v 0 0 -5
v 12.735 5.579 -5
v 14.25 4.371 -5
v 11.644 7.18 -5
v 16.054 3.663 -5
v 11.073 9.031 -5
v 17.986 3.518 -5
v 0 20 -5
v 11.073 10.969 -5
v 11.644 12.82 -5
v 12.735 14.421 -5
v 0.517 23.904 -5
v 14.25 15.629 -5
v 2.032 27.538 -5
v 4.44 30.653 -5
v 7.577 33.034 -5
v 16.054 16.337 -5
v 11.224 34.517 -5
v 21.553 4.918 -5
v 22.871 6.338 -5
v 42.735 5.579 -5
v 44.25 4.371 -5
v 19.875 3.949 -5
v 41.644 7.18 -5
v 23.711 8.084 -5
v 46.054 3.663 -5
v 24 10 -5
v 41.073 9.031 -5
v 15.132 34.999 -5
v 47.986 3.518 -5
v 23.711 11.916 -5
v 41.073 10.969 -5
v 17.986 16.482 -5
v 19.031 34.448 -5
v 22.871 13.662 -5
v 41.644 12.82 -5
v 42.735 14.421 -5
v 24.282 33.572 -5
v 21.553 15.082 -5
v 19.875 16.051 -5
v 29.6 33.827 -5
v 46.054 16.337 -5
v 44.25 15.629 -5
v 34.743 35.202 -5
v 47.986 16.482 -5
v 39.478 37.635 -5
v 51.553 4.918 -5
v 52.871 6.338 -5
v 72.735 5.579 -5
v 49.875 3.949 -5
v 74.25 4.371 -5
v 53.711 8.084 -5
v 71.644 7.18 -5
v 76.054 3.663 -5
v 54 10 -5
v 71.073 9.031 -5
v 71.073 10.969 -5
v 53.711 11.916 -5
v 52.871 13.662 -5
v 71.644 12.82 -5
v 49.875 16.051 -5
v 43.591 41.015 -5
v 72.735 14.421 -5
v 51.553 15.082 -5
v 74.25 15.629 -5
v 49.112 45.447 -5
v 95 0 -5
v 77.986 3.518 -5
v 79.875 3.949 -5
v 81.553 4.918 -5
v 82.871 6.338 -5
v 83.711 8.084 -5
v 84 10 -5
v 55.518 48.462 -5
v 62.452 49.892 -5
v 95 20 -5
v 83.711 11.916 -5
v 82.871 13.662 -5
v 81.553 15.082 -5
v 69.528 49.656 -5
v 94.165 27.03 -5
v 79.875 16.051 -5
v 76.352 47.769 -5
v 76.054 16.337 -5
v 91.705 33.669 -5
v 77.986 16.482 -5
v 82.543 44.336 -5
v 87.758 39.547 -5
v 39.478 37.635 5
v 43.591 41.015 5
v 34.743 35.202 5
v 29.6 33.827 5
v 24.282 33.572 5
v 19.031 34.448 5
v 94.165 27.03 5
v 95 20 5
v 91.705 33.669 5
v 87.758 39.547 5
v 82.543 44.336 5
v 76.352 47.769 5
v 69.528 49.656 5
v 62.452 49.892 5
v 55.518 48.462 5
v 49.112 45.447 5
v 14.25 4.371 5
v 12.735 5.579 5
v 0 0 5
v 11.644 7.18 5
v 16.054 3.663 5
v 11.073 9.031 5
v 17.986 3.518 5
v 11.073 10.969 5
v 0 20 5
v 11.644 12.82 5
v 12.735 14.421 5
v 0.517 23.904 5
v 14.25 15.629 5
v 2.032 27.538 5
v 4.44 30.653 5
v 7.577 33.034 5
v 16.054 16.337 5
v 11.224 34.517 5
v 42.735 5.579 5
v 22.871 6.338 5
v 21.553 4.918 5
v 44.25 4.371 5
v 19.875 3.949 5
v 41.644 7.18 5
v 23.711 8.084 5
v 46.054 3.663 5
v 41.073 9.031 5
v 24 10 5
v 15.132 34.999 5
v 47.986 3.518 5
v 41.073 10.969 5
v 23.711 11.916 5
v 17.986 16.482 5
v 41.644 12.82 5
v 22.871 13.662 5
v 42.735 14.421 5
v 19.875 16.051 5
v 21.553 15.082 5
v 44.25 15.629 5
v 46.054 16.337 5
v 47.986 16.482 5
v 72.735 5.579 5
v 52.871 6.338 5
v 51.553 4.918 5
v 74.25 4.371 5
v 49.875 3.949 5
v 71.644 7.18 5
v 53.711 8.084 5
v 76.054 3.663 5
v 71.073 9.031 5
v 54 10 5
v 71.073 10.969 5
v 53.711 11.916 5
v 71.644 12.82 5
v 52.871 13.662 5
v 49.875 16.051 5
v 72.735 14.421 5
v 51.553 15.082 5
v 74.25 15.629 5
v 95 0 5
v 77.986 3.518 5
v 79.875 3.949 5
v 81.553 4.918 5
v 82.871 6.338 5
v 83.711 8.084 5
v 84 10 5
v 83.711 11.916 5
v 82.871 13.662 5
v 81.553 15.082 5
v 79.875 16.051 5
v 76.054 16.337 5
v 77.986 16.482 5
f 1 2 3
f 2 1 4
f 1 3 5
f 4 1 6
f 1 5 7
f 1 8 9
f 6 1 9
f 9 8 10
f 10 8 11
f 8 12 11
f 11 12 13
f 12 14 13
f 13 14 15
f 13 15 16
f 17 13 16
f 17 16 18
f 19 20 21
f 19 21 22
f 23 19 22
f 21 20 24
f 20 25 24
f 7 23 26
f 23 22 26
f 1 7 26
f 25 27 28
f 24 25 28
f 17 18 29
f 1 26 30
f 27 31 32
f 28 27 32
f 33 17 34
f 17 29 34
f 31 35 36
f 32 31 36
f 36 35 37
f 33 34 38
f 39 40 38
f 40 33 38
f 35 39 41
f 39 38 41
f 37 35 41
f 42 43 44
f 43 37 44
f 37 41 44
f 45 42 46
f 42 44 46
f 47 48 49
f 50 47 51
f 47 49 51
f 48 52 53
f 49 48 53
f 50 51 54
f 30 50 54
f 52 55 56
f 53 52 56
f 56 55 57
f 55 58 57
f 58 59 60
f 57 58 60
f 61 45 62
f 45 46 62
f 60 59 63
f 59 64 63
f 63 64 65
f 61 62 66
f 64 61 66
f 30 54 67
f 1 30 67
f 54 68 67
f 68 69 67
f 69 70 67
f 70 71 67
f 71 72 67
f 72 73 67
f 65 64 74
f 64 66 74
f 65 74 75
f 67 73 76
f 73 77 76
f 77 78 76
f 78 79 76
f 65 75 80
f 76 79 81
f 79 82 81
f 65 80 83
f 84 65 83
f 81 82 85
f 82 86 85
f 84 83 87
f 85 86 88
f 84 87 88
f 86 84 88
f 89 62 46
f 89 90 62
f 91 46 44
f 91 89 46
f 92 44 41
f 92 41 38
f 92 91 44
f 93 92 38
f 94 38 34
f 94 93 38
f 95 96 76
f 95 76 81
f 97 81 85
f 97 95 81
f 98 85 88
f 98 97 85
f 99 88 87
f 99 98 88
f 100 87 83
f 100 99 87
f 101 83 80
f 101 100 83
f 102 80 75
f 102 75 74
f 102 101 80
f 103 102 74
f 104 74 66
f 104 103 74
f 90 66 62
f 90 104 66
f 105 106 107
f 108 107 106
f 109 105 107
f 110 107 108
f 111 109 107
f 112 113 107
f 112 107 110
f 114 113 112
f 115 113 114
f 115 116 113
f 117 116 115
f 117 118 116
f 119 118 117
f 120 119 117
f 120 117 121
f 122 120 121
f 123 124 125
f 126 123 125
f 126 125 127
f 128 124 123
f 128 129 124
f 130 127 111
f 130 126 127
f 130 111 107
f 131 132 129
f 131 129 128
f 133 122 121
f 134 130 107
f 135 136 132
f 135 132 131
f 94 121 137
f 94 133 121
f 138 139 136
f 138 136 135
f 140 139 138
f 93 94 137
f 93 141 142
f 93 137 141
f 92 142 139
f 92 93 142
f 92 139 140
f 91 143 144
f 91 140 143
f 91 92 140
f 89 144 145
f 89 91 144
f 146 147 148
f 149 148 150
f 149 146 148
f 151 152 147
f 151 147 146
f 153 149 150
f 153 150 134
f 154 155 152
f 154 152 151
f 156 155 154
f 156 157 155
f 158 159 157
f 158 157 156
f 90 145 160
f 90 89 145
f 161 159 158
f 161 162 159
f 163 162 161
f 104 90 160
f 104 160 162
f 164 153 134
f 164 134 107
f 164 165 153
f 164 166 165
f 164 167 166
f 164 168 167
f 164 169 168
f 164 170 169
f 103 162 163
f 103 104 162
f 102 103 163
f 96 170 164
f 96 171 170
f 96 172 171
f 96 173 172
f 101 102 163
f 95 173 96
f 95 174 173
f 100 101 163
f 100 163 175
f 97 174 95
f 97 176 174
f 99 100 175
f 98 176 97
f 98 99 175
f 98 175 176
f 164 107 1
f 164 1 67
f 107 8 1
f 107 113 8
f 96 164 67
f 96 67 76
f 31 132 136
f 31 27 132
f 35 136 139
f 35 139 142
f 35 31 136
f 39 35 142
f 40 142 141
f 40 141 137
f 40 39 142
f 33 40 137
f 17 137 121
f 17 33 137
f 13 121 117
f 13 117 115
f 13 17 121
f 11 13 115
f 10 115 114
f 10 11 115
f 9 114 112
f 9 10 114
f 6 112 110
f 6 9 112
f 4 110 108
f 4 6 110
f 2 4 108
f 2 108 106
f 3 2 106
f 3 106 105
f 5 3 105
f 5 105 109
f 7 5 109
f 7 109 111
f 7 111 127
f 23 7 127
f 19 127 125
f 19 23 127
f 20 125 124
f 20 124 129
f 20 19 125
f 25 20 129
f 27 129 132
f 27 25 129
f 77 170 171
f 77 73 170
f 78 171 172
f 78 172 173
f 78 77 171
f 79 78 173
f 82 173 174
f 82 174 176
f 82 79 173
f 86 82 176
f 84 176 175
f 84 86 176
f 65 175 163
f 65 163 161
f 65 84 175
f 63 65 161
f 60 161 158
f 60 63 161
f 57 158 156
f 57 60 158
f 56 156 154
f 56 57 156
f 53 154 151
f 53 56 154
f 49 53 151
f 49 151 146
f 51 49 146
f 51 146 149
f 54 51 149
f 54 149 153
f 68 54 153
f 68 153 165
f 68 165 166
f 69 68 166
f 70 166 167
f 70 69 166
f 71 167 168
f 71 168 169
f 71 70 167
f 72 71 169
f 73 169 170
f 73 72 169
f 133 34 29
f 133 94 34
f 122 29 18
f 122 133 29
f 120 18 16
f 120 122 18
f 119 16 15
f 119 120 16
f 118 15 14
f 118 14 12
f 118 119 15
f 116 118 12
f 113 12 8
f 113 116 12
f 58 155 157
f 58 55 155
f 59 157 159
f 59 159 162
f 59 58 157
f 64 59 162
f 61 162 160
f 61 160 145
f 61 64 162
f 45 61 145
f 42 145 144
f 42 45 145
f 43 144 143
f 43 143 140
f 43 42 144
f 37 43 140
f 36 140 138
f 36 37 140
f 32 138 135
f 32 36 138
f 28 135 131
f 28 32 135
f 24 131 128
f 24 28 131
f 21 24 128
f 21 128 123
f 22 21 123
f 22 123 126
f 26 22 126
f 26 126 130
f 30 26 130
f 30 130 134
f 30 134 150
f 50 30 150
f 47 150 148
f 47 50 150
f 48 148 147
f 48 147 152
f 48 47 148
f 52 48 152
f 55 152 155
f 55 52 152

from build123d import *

# Parameters (mm, degrees)
SKETCH1_R           = 6.5
BOSS_EXTRUDE1_DEPTH = 5


with BuildPart() as part:
    # Sketch1 → Boss-Extrude1 (new body, symmetric)
    with BuildSketch(Plane.XY):
        with BuildLine():
            Line((0, 20), (0, 0))
            Line((0, 0), (95, 0))
            Line((95, 0), (95, 20))
            ThreePointArc((95, 20), (76.35181203, 47.769342153), (43.590909091, 41.015490155))
            ThreePointArc((43.590909091, 41.015490155), (32.208180594, 34.376961736), (19.03125, 34.448149481))
            ThreePointArc((19.03125, 34.448149481), (5.929960033, 31.947149242), (0, 20))
        make_face()
        with Locations((17.5, 10)):
            Circle(SKETCH1_R, mode=Mode.SUBTRACT)
        with Locations((47.5, 10)):
            Circle(SKETCH1_R, mode=Mode.SUBTRACT)
        with Locations((77.5, 10)):
            Circle(SKETCH1_R, mode=Mode.SUBTRACT)
    extrude(amount=BOSS_EXTRUDE1_DEPTH, both=True)


solid = part.part
